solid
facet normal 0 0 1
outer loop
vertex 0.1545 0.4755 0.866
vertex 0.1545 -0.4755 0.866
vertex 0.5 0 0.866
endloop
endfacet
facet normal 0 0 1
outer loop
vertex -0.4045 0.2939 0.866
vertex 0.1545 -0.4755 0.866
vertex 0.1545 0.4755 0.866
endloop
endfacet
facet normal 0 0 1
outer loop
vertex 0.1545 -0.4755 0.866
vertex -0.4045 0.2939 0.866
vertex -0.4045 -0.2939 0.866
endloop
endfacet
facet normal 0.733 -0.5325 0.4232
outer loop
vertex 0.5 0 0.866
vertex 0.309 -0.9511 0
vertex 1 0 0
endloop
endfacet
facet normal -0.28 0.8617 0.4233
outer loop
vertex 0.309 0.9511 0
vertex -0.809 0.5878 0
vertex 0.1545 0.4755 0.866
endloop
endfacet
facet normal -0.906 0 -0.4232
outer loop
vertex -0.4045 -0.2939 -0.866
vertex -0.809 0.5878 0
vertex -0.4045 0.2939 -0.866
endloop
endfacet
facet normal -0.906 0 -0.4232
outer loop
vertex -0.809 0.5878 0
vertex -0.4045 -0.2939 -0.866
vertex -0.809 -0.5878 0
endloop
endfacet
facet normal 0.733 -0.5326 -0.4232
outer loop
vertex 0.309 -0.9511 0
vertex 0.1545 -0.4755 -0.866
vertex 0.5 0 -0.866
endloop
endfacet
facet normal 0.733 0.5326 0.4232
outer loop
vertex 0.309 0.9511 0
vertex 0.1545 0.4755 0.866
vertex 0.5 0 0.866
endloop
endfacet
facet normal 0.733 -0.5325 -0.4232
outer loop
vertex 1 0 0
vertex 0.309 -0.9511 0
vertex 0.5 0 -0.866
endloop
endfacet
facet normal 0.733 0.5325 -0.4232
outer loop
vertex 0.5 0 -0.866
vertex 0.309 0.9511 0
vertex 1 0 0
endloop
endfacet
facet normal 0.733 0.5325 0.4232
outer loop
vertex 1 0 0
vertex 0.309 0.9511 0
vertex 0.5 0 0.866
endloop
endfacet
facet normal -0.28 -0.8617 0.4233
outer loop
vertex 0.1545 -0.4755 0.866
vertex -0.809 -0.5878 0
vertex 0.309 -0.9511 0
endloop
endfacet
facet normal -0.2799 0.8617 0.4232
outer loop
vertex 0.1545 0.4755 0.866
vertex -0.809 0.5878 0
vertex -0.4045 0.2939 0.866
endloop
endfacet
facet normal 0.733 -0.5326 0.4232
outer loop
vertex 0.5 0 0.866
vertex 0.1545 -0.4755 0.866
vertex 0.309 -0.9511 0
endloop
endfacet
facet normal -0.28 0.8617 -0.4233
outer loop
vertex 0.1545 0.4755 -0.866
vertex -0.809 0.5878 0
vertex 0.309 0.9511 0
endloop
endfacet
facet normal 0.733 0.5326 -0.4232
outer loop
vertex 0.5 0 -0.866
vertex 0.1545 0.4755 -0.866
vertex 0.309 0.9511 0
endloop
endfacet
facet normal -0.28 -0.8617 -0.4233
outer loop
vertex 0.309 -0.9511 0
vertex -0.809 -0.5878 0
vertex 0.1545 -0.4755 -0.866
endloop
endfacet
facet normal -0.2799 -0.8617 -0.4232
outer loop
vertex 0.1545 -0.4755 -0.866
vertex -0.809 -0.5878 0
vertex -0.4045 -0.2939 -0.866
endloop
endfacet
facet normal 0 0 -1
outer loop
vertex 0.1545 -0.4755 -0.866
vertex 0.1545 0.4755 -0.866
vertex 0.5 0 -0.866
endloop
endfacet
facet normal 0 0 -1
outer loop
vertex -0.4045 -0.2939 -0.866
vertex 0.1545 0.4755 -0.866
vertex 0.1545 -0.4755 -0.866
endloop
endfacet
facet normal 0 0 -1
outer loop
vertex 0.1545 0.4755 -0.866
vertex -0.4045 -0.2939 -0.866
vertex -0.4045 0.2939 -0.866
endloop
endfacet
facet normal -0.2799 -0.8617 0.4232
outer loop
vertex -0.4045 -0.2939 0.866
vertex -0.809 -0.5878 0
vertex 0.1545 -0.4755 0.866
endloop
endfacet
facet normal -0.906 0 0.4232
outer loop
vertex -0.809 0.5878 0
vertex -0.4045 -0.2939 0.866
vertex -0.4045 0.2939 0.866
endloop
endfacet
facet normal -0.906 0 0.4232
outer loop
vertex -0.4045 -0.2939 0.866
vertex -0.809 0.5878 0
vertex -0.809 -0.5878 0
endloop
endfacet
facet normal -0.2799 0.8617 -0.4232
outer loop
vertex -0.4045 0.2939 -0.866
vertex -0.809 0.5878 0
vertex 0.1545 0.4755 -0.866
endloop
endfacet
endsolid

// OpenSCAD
sphere("a");
sphere(-1);
sphere(r = 0);
sphere(style = "ico");
sphere(style = 1);
